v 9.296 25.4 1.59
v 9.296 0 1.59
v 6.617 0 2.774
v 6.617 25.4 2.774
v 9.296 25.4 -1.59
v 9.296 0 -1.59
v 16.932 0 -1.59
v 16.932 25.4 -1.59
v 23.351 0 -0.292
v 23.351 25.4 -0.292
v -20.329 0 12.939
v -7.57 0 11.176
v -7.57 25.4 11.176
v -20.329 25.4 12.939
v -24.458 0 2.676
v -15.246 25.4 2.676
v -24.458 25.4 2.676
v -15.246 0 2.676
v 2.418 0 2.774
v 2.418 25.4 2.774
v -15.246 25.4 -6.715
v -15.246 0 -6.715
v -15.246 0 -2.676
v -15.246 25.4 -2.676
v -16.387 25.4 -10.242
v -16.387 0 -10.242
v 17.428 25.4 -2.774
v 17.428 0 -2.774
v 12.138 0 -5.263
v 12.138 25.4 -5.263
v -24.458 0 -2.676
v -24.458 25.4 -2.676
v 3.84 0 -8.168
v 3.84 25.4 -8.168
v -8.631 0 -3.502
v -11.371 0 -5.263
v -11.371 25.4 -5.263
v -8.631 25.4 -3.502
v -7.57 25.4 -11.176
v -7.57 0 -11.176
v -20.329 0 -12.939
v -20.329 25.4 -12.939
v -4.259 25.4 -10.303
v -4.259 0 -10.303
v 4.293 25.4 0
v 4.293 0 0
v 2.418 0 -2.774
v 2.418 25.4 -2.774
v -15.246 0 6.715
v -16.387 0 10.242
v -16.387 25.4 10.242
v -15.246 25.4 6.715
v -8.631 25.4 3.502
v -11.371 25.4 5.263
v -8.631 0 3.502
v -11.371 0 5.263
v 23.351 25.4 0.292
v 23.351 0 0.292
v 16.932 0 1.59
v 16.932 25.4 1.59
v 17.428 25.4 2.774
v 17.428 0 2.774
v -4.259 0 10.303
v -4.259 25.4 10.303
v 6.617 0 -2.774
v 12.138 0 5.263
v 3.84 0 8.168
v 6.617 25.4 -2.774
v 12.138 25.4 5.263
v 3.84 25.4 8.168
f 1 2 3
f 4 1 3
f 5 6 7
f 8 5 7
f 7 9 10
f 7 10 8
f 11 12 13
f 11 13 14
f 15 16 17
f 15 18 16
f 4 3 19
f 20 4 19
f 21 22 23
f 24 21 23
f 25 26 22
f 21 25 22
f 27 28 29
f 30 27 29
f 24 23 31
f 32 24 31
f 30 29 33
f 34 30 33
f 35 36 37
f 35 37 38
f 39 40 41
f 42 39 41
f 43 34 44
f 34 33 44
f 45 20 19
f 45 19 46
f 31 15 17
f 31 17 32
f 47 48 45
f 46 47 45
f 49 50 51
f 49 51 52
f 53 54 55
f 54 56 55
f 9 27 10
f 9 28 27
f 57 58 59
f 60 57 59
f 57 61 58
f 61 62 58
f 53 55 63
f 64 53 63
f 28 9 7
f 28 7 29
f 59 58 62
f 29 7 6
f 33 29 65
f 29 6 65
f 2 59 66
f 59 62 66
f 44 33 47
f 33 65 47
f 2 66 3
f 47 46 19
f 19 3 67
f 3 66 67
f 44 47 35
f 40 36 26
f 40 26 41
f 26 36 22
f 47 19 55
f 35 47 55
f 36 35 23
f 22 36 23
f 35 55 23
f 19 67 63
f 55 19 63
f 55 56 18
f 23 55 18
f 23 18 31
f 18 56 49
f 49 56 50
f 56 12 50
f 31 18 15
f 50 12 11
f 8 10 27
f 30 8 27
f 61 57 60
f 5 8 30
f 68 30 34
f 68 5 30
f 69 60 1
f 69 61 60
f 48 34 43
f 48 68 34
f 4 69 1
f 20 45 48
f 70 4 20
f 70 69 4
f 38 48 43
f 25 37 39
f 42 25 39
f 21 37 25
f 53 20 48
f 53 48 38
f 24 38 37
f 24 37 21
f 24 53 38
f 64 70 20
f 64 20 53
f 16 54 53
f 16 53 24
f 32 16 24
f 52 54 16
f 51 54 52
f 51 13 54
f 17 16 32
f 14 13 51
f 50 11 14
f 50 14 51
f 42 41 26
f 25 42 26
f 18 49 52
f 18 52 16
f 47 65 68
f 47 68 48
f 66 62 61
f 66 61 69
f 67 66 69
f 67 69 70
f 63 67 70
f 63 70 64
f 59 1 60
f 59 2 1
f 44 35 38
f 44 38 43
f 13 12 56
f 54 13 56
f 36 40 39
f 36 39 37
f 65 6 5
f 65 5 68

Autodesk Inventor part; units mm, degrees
ref_plane "YZ Plane" through (0, 0, 0) normal (1, 0, 0) x (0, 1, 0)
ref_plane "XZ Plane" through (0, 0, 0) normal (0, 1, 0) x (-1, 0, 0)
ref_plane "XY Plane" through (0, 0, 0) normal (0, 0, 1) x (1, 0, 0)
sketch "Sketch1" plane through (0, 0, 0) normal (0, 1, 0) x (-1, 0, 0)
  line L0 (-17.4285, 2.7736) -> (-12.1383, 5.2631)
  line L1 (-12.1383, 5.2631) -> (-3.84, 8.1675)
  line L2 (-3.84, 8.1675) -> (4.2592, 10.3027)
  line L3 (7.5702, 11.1757) -> (20.3289, 12.9391)
  line L4 (20.3289, 12.9391) -> (16.3872, 10.2421)
  line L5 (16.3872, 10.2421) -> (15.2462, 6.7153)
  line L6 (15.2462, 6.7153) -> (15.2462, 2.676)
  line L7 (15.2462, 2.676) -> (24.4575, 2.676)
  line L8 (24.4575, 2.676) -> (24.4575, 0)
  line L9 (-17.4285, 2.7736) -> (-23.3511, 0.2916)
  line L10 (24.4575, 0) -> (-4.2928, 0)
  line L11 (-17.4285, -2.7736) -> (-12.1383, -5.2631)
  line L12 (-12.1383, -5.2631) -> (-3.84, -8.1675)
  line L13 (-3.84, -8.1675) -> (4.2592, -10.3027)
  line L14 (7.5702, -11.1757) -> (20.3289, -12.9391)
  line L15 (20.3289, -12.9391) -> (16.3872, -10.2421)
  line L16 (16.3872, -10.2421) -> (15.2462, -6.7153)
  line L17 (15.2462, -6.7153) -> (15.2462, -2.676)
  line L18 (15.2462, -2.676) -> (24.4575, -2.676)
  line L19 (24.4575, -2.676) -> (24.4575, 0)
  line L20 (-17.4285, -2.7736) -> (-23.3511, -0.2916)
  line L21 (15.2462, -2.676) -> (15.2462, 2.676)
  line L22 (7.5702, 11.1757) -> (11.3708, 5.2631)
  line L23 (11.3708, 5.2631) -> (8.6308, 3.5018)
  line L24 (8.6308, 3.5018) -> (4.2592, 10.3027)
  line L25 (7.5702, -11.1757) -> (11.3708, -5.2631)
  line L26 (8.6308, -3.5018) -> (4.2592, -10.3027)
  line L27 (11.3708, -5.2631) -> (8.6308, -3.5018)
  line L28 (-9.2958, -1.5896) -> (-6.6168, -2.7736)
  line L29 (-6.6168, -2.7736) -> (-2.4179, -2.7736)
  line L30 (-2.4179, -2.7736) -> (-4.2928, 0)
  line L31 (-9.2958, 1.5896) -> (-6.6168, 2.7736)
  line L32 (-6.6168, 2.7736) -> (-2.4179, 2.7736)
  line L33 (-2.4179, 2.7736) -> (-4.2928, 0)
  line L34 (-9.2958, 1.5896) -> (-16.9323, 1.5896)
  line L35 (-23.3511, 0.2916) -> (-16.9323, 1.5896)
  line L36 (-9.2958, -1.5896) -> (-16.9323, -1.5896)
  line L37 (-23.3511, -0.2916) -> (-16.9323, -1.5896)
  point P0 (0, 0)
  point P1 (0, 0)
extrude "Extrusion1" add sketch "Sketch1" along normal blind 25.4
